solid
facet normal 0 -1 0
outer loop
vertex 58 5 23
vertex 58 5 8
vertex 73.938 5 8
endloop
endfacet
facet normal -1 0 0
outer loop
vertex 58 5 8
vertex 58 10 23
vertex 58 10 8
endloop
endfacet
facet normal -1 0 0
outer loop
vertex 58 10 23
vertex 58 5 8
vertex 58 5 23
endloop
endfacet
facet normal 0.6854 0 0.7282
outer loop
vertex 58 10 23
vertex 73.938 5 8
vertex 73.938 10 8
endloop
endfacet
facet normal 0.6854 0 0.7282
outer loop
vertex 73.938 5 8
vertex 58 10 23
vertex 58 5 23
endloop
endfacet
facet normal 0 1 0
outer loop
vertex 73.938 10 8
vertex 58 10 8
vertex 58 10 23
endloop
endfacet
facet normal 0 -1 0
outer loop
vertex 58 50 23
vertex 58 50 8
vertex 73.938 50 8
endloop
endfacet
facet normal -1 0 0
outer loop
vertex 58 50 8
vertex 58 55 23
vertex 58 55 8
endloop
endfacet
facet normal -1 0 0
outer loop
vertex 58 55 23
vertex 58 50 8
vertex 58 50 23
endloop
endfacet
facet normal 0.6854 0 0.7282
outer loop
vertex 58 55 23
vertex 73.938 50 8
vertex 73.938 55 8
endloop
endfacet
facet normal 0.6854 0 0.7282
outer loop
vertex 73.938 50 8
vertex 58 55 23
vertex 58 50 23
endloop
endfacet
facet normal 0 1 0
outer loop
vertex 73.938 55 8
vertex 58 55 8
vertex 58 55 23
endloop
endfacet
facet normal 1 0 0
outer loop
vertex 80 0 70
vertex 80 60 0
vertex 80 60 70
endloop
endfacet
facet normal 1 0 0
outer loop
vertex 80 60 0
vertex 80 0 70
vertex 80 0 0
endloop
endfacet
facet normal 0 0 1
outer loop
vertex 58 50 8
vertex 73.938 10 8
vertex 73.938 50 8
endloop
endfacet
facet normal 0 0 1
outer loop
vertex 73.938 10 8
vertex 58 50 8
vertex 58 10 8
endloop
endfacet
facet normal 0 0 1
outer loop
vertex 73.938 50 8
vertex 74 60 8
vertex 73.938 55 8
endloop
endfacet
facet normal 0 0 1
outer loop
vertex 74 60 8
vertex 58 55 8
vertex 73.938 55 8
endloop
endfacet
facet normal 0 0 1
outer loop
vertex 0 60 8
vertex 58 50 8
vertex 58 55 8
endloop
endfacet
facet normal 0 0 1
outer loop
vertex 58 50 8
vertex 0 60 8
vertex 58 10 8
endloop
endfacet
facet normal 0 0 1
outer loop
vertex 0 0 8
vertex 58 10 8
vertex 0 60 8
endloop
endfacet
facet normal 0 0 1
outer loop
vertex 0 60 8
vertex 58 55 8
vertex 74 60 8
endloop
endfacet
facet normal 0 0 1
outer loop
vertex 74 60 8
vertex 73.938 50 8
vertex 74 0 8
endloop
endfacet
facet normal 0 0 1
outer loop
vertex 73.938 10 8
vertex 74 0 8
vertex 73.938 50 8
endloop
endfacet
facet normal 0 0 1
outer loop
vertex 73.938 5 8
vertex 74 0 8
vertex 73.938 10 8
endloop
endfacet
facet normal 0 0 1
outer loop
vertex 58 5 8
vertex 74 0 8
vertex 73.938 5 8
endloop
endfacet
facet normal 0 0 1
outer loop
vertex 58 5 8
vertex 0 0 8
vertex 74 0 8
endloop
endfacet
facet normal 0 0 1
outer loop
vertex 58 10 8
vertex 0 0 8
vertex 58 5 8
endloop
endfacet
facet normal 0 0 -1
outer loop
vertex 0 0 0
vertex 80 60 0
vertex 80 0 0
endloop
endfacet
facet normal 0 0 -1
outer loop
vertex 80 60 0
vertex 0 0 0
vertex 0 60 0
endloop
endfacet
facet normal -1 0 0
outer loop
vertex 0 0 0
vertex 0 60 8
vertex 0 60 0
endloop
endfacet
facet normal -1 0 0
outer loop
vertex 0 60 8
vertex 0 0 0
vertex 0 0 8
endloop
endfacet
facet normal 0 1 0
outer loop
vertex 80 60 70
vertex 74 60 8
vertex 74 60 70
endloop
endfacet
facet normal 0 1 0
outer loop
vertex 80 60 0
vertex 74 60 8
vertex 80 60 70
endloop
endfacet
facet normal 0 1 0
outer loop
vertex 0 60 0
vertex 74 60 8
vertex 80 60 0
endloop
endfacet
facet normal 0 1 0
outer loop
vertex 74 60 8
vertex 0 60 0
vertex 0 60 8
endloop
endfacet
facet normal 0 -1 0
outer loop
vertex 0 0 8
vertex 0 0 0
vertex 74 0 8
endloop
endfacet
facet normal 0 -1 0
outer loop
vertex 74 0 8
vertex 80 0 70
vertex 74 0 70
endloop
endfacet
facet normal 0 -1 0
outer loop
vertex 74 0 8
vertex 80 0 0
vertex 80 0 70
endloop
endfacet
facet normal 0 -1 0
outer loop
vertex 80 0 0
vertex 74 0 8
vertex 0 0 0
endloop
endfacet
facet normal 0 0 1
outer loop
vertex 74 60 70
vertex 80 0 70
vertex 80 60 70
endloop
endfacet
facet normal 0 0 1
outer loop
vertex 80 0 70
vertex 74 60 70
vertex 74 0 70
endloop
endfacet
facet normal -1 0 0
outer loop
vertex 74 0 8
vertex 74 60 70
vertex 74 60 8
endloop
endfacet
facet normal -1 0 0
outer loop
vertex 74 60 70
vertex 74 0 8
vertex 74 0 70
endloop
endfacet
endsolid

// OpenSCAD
$fn = 32;

// ----------------------------------------------------------------------
// Rib bracket: 2-gusset L bracket
// ----------------------------------------------------------------------

// --- parameters (mm) ---
base_l = 80;              // foot length, X
base_w = 60;              // foot width, Y
base_t = 8;               // foot thickness
plate_t = 6;              // upright plate thickness
plate_h = 70;             // overall height
gus_l = 16;               // gusset leg along the foot
gus_h = 16;               // gusset height
gus_t = 5;                // gusset thickness
gus_edge = 5;             // gusset margin from the foot edge
n_gus = 2;                // gusset count

gus_pitch = (base_w - 2 * gus_edge - gus_t) / (n_gus - 1);  // gusset pitch

union() {
  cube([base_l, base_w, base_t]);
  translate([base_l - plate_t, 0, base_t - 1])
    cube([plate_t, base_w, plate_h - base_t + 1]);
  for (i = [0 : n_gus - 1])
    translate([base_l - plate_t - gus_l, gus_edge + i * gus_pitch, base_t - 1])
      rotate([-90, 0, 0])
        linear_extrude(height = gus_t)
          polygon(points = [[0, 0], [gus_l + 1, 0], [0, -gus_h]]);
}
